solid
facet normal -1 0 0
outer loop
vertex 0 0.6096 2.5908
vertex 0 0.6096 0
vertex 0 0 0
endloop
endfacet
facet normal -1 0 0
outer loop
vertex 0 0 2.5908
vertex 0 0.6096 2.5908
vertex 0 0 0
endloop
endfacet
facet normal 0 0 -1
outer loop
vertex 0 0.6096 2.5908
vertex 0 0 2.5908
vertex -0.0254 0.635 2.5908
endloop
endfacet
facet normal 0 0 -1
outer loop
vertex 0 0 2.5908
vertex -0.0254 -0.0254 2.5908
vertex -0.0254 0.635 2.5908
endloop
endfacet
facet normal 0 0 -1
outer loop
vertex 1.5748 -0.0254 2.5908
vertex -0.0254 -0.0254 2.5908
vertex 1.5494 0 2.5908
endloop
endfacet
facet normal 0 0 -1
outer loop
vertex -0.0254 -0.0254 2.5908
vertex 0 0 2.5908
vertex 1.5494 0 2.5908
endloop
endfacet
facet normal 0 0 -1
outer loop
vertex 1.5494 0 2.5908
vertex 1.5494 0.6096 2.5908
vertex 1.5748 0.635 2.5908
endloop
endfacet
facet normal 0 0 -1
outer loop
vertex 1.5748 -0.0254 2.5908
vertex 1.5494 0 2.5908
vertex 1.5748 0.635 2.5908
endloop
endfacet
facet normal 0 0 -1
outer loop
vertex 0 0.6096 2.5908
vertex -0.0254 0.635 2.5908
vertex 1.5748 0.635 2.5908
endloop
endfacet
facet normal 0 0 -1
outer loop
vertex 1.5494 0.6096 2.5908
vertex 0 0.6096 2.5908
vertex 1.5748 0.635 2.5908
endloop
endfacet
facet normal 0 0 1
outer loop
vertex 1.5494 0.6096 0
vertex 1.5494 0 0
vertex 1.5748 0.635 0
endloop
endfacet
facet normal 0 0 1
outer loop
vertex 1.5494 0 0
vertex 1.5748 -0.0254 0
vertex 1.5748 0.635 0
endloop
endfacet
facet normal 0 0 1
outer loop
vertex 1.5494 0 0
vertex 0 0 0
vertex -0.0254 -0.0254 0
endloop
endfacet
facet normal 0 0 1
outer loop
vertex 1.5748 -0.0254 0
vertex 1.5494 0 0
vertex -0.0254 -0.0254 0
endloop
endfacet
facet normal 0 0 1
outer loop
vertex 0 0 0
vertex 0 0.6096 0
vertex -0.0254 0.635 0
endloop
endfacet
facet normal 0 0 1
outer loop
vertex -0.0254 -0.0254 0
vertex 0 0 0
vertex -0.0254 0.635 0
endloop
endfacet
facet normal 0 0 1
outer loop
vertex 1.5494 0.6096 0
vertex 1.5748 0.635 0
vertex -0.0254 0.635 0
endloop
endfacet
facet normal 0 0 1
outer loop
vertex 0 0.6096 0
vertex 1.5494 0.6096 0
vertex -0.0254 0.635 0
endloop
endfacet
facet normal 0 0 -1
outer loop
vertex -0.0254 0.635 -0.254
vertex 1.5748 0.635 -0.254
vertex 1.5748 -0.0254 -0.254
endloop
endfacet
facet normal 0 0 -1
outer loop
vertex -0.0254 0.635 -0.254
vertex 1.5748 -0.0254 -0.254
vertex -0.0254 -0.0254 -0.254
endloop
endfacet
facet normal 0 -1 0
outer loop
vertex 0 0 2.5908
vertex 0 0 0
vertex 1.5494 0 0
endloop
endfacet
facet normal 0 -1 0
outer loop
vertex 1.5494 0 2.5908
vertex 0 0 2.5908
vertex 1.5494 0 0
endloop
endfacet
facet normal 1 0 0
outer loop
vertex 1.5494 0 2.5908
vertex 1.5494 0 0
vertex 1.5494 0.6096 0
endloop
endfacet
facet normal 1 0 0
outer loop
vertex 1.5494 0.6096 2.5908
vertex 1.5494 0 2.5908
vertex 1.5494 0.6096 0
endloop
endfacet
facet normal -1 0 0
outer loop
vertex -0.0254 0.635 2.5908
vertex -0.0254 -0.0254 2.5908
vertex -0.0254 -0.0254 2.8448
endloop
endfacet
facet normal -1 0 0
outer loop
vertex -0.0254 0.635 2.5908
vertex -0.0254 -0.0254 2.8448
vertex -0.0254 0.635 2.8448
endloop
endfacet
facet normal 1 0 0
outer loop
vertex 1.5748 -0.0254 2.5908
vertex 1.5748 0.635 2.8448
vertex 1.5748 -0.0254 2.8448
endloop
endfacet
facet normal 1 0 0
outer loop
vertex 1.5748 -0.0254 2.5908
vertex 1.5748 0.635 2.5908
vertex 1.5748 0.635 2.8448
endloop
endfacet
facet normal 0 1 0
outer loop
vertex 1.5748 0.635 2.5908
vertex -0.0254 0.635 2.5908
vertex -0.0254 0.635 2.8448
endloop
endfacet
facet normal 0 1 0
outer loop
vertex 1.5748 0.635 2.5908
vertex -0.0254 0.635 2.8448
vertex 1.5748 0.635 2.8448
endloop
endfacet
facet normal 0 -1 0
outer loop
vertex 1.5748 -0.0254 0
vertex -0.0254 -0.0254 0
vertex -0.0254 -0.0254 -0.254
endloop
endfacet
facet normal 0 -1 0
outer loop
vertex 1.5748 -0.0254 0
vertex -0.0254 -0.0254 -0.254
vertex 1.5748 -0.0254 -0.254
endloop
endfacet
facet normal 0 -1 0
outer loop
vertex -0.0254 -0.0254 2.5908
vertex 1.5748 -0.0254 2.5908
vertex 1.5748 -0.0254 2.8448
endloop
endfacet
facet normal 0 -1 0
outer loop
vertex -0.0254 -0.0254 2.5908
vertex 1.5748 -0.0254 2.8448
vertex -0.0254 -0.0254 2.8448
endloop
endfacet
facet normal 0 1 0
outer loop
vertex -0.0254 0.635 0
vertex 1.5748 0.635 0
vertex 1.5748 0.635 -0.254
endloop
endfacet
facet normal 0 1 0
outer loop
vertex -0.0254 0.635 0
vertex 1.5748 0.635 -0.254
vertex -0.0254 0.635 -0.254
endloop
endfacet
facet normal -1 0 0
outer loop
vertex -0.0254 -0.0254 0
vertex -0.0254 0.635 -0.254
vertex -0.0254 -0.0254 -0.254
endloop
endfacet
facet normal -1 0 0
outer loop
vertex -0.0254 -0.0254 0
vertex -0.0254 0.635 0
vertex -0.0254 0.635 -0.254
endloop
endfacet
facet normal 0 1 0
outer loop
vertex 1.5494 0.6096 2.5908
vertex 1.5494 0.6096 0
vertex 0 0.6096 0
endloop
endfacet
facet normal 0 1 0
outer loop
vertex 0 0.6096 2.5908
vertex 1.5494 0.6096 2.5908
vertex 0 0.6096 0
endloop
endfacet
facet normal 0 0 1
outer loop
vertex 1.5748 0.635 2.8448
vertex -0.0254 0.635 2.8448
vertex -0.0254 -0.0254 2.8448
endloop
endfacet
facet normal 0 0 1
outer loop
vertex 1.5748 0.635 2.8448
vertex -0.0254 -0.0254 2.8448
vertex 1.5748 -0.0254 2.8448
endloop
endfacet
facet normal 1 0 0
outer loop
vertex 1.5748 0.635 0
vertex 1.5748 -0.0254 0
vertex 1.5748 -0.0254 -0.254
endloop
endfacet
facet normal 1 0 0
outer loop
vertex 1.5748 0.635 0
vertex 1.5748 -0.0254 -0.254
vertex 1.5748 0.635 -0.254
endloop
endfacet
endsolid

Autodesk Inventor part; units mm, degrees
ref_plane "YZ Plane" through (0, 0, 0) normal (1, 0, 0) x (0, 1, 0)
ref_plane "XZ Plane" through (0, 0, 0) normal (0, 1, 0) x (-1, 0, 0)
ref_plane "XY Plane" through (0, 0, 0) normal (0, 0, 1) x (1, 0, 0)
sketch "Sketch1" plane through (0, 0, 0) normal (0, 0, 1) x (1, 0, 0)
  line L0 (0, 0) -> (1.5494, 0)
  line L1 (1.5494, 0) -> (1.5494, 0.6096)
  line L2 (1.5494, 0.6096) -> (0, 0.6096)
  line L3 (0, 0.6096) -> (0, 0)
  dimension "d0" = 0.6096
  dimension "d1" = 1.5494
extrude "Extrusion1" add sketch "Sketch1" along normal blind 2.5908
sketch "Sketch2" plane through (0, 0, 2.5908) normal (0, 0, 1) x (1, 0, 0)
  line L0 (-0.0254, 0.635) -> (1.5748, 0.635)
  line L1 (1.5748, 0.635) -> (1.5748, -0.0254)
  line L2 (1.5748, -0.0254) -> (-0.0254, -0.0254)
  line L3 (-0.0254, -0.0254) -> (-0.0254, 0.635)
  line L4 (1.5494, 0) -> (1.5494, 0.6096) projected
  line L5 (0, 0.6096) -> (0, 0) projected
  line L6 (1.5494, 0.6096) -> (0, 0.6096) projected
  line L7 (0, 0) -> (1.5494, 0) projected
  dimension "d4" = 0.0254
  dimension "d5" = 0.0254
  dimension "d6" = 0.0254
  dimension "d7" = 0.0254
extrude "Extrusion2" add sketch "Sketch2" along normal blind 0.254 contours L0 L1 L2 L3 | L7 L5 L6 L4
sketch "Sketch3" plane through (0, 0, 0) normal (0, 0, -1) x (-1, 0, 0)
  line L0 (0.0254, -0.0254) -> (-1.5748, -0.0254)
  line L1 (-1.5748, -0.0254) -> (-1.5748, 0.635)
  line L2 (-1.5748, 0.635) -> (0.0254, 0.635)
  line L3 (0.0254, 0.635) -> (0.0254, -0.0254)
  point P0 (0, 0)
extrude "Extrusion3" add sketch "Sketch3" along normal blind 0.254
properties part number "s174 Resistor"
